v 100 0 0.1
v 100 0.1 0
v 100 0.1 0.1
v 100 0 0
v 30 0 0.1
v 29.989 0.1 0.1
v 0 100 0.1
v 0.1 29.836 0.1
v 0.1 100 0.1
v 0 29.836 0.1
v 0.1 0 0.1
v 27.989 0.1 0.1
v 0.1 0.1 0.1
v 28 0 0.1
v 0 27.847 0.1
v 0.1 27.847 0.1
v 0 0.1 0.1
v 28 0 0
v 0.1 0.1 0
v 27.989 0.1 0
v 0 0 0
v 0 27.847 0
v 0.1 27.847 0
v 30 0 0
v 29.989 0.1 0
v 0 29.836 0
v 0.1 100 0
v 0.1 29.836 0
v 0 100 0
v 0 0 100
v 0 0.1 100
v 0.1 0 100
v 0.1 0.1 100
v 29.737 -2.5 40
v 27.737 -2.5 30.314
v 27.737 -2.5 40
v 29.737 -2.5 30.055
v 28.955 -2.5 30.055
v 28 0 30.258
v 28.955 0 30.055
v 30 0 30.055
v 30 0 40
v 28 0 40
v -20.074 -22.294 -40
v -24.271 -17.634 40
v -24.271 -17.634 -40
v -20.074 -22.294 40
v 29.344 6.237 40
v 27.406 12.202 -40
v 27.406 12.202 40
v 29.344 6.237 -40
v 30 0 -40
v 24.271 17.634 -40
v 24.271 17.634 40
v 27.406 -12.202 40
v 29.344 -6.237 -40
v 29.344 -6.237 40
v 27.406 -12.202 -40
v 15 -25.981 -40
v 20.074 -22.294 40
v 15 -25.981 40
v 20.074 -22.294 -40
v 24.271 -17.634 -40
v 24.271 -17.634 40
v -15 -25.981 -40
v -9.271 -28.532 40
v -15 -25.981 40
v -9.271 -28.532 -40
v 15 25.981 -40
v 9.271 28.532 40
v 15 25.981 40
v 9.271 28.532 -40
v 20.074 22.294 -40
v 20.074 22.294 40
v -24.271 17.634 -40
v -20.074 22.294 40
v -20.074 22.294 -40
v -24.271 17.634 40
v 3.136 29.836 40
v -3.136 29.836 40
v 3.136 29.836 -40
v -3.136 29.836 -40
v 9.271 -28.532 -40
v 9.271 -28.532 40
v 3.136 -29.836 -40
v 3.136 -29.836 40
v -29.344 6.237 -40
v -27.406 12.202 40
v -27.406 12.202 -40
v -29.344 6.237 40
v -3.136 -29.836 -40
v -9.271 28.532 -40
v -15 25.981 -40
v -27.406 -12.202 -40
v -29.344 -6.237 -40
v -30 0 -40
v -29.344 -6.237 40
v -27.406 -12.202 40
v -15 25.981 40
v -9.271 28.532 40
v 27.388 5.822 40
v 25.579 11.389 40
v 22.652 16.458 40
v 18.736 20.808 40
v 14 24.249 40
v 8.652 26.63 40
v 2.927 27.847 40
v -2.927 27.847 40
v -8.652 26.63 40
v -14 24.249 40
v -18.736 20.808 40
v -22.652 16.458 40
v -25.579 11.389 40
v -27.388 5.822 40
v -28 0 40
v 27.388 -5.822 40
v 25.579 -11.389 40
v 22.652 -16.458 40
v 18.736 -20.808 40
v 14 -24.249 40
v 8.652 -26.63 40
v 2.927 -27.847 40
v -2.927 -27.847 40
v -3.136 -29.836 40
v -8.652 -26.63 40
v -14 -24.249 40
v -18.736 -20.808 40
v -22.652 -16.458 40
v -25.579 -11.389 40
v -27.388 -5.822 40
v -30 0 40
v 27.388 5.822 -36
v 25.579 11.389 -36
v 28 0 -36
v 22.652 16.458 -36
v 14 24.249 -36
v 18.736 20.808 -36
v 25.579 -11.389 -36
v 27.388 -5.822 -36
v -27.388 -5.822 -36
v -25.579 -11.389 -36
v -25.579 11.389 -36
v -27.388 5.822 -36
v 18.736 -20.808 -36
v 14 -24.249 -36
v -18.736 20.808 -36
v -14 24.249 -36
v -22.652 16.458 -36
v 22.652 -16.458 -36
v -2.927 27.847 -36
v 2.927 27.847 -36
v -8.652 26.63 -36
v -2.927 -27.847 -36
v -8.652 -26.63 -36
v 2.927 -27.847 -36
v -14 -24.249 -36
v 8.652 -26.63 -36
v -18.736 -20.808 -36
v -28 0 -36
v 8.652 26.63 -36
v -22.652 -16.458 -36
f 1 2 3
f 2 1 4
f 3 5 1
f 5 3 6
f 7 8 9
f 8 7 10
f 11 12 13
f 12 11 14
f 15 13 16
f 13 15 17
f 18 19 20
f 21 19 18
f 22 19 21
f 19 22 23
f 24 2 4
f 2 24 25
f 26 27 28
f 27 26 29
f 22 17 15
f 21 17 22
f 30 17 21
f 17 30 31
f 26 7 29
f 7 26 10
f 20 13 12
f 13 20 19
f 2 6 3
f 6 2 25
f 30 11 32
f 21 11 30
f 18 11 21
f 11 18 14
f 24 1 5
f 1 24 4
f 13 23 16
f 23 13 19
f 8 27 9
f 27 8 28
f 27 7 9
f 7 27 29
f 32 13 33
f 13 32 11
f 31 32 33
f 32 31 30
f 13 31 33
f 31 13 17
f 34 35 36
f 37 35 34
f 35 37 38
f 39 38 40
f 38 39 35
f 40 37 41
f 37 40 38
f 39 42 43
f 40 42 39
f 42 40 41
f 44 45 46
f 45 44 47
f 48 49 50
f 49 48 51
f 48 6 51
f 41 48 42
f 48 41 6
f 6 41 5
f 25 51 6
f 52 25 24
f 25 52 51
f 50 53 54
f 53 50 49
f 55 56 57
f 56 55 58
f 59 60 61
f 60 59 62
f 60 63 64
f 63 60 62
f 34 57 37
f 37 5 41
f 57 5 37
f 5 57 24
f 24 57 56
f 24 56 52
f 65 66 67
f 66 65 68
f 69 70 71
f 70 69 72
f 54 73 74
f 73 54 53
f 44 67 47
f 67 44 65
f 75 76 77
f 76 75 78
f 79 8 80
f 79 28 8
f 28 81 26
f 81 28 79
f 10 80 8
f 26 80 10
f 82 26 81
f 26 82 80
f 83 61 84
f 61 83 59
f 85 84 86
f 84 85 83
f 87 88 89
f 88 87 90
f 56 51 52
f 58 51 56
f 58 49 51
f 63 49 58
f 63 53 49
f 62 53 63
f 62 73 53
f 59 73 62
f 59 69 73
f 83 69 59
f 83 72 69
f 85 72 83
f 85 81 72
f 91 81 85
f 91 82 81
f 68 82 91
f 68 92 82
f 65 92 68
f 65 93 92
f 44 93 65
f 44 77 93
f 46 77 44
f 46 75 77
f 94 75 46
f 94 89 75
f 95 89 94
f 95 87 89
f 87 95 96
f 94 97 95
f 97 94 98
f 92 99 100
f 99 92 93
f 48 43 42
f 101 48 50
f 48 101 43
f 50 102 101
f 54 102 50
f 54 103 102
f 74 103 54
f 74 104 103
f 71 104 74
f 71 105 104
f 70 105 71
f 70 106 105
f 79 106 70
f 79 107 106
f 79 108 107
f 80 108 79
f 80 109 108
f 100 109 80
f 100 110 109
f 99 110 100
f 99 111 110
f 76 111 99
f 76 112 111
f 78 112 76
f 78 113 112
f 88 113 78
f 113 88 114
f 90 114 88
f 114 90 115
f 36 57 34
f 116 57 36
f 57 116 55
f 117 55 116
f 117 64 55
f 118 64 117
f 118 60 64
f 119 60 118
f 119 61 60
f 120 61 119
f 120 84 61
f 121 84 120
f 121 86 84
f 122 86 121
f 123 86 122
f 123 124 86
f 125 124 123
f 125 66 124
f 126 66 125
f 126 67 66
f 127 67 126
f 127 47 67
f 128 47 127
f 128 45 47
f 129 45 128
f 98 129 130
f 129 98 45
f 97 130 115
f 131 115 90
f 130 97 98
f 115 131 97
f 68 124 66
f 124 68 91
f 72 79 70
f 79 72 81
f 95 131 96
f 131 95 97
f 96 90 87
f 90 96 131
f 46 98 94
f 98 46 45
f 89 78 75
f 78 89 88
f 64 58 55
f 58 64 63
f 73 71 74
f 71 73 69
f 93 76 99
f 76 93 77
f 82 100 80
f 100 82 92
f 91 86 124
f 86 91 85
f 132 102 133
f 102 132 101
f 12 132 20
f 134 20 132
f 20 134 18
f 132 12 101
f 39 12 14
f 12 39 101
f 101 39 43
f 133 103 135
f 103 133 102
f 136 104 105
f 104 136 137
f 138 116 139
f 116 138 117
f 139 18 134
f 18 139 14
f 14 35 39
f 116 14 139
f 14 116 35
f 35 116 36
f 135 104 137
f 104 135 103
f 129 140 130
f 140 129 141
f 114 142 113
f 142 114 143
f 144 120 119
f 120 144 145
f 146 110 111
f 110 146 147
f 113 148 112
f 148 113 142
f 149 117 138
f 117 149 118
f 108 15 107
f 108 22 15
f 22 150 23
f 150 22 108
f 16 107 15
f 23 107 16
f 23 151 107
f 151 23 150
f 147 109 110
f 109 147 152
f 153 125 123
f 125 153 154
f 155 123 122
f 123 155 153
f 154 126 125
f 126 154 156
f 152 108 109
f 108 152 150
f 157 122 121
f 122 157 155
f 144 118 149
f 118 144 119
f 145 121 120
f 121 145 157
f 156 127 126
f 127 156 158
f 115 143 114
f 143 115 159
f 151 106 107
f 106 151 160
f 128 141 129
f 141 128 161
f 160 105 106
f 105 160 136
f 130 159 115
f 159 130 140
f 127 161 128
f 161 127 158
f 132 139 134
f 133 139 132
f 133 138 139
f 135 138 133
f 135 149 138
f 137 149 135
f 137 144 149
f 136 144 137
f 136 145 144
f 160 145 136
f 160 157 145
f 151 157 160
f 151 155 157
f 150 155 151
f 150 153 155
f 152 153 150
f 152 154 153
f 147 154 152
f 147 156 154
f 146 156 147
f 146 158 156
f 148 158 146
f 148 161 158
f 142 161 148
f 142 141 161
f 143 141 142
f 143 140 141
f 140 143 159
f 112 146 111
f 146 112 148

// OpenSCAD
    // Combined Scene

    // Permanent Model
    
    // Permanent Model (Black)
    color([0, 0, 0]) {
        // Your permanent model code here
        cube([100,0.1,0.1], center = false);
        cube([0.1,100,0.1], center = false);
        cube([0.1,0.1,100], center = false);
    }
    

    // Dynamic Model
    difference() {
    // Main body of the mug
    cylinder(h=80, r=30, center=true);
    // Hollow out the inside of the mug
    translate([0, 0, 2])
        cylinder(h=76, r=28, center=true);
    
    // Handle of the mug
    translate([30, 0, 40])
        rotate([90, 0, 0])
            difference() {
                scale([1, 1, 0.5])
                    cylinder(h=10, r=10, center=true);
                translate([-5, -5, -5])
                    scale([1, 1, 0.5])
                        cylinder(h=20, r=10, center=true);
            }
}
    
